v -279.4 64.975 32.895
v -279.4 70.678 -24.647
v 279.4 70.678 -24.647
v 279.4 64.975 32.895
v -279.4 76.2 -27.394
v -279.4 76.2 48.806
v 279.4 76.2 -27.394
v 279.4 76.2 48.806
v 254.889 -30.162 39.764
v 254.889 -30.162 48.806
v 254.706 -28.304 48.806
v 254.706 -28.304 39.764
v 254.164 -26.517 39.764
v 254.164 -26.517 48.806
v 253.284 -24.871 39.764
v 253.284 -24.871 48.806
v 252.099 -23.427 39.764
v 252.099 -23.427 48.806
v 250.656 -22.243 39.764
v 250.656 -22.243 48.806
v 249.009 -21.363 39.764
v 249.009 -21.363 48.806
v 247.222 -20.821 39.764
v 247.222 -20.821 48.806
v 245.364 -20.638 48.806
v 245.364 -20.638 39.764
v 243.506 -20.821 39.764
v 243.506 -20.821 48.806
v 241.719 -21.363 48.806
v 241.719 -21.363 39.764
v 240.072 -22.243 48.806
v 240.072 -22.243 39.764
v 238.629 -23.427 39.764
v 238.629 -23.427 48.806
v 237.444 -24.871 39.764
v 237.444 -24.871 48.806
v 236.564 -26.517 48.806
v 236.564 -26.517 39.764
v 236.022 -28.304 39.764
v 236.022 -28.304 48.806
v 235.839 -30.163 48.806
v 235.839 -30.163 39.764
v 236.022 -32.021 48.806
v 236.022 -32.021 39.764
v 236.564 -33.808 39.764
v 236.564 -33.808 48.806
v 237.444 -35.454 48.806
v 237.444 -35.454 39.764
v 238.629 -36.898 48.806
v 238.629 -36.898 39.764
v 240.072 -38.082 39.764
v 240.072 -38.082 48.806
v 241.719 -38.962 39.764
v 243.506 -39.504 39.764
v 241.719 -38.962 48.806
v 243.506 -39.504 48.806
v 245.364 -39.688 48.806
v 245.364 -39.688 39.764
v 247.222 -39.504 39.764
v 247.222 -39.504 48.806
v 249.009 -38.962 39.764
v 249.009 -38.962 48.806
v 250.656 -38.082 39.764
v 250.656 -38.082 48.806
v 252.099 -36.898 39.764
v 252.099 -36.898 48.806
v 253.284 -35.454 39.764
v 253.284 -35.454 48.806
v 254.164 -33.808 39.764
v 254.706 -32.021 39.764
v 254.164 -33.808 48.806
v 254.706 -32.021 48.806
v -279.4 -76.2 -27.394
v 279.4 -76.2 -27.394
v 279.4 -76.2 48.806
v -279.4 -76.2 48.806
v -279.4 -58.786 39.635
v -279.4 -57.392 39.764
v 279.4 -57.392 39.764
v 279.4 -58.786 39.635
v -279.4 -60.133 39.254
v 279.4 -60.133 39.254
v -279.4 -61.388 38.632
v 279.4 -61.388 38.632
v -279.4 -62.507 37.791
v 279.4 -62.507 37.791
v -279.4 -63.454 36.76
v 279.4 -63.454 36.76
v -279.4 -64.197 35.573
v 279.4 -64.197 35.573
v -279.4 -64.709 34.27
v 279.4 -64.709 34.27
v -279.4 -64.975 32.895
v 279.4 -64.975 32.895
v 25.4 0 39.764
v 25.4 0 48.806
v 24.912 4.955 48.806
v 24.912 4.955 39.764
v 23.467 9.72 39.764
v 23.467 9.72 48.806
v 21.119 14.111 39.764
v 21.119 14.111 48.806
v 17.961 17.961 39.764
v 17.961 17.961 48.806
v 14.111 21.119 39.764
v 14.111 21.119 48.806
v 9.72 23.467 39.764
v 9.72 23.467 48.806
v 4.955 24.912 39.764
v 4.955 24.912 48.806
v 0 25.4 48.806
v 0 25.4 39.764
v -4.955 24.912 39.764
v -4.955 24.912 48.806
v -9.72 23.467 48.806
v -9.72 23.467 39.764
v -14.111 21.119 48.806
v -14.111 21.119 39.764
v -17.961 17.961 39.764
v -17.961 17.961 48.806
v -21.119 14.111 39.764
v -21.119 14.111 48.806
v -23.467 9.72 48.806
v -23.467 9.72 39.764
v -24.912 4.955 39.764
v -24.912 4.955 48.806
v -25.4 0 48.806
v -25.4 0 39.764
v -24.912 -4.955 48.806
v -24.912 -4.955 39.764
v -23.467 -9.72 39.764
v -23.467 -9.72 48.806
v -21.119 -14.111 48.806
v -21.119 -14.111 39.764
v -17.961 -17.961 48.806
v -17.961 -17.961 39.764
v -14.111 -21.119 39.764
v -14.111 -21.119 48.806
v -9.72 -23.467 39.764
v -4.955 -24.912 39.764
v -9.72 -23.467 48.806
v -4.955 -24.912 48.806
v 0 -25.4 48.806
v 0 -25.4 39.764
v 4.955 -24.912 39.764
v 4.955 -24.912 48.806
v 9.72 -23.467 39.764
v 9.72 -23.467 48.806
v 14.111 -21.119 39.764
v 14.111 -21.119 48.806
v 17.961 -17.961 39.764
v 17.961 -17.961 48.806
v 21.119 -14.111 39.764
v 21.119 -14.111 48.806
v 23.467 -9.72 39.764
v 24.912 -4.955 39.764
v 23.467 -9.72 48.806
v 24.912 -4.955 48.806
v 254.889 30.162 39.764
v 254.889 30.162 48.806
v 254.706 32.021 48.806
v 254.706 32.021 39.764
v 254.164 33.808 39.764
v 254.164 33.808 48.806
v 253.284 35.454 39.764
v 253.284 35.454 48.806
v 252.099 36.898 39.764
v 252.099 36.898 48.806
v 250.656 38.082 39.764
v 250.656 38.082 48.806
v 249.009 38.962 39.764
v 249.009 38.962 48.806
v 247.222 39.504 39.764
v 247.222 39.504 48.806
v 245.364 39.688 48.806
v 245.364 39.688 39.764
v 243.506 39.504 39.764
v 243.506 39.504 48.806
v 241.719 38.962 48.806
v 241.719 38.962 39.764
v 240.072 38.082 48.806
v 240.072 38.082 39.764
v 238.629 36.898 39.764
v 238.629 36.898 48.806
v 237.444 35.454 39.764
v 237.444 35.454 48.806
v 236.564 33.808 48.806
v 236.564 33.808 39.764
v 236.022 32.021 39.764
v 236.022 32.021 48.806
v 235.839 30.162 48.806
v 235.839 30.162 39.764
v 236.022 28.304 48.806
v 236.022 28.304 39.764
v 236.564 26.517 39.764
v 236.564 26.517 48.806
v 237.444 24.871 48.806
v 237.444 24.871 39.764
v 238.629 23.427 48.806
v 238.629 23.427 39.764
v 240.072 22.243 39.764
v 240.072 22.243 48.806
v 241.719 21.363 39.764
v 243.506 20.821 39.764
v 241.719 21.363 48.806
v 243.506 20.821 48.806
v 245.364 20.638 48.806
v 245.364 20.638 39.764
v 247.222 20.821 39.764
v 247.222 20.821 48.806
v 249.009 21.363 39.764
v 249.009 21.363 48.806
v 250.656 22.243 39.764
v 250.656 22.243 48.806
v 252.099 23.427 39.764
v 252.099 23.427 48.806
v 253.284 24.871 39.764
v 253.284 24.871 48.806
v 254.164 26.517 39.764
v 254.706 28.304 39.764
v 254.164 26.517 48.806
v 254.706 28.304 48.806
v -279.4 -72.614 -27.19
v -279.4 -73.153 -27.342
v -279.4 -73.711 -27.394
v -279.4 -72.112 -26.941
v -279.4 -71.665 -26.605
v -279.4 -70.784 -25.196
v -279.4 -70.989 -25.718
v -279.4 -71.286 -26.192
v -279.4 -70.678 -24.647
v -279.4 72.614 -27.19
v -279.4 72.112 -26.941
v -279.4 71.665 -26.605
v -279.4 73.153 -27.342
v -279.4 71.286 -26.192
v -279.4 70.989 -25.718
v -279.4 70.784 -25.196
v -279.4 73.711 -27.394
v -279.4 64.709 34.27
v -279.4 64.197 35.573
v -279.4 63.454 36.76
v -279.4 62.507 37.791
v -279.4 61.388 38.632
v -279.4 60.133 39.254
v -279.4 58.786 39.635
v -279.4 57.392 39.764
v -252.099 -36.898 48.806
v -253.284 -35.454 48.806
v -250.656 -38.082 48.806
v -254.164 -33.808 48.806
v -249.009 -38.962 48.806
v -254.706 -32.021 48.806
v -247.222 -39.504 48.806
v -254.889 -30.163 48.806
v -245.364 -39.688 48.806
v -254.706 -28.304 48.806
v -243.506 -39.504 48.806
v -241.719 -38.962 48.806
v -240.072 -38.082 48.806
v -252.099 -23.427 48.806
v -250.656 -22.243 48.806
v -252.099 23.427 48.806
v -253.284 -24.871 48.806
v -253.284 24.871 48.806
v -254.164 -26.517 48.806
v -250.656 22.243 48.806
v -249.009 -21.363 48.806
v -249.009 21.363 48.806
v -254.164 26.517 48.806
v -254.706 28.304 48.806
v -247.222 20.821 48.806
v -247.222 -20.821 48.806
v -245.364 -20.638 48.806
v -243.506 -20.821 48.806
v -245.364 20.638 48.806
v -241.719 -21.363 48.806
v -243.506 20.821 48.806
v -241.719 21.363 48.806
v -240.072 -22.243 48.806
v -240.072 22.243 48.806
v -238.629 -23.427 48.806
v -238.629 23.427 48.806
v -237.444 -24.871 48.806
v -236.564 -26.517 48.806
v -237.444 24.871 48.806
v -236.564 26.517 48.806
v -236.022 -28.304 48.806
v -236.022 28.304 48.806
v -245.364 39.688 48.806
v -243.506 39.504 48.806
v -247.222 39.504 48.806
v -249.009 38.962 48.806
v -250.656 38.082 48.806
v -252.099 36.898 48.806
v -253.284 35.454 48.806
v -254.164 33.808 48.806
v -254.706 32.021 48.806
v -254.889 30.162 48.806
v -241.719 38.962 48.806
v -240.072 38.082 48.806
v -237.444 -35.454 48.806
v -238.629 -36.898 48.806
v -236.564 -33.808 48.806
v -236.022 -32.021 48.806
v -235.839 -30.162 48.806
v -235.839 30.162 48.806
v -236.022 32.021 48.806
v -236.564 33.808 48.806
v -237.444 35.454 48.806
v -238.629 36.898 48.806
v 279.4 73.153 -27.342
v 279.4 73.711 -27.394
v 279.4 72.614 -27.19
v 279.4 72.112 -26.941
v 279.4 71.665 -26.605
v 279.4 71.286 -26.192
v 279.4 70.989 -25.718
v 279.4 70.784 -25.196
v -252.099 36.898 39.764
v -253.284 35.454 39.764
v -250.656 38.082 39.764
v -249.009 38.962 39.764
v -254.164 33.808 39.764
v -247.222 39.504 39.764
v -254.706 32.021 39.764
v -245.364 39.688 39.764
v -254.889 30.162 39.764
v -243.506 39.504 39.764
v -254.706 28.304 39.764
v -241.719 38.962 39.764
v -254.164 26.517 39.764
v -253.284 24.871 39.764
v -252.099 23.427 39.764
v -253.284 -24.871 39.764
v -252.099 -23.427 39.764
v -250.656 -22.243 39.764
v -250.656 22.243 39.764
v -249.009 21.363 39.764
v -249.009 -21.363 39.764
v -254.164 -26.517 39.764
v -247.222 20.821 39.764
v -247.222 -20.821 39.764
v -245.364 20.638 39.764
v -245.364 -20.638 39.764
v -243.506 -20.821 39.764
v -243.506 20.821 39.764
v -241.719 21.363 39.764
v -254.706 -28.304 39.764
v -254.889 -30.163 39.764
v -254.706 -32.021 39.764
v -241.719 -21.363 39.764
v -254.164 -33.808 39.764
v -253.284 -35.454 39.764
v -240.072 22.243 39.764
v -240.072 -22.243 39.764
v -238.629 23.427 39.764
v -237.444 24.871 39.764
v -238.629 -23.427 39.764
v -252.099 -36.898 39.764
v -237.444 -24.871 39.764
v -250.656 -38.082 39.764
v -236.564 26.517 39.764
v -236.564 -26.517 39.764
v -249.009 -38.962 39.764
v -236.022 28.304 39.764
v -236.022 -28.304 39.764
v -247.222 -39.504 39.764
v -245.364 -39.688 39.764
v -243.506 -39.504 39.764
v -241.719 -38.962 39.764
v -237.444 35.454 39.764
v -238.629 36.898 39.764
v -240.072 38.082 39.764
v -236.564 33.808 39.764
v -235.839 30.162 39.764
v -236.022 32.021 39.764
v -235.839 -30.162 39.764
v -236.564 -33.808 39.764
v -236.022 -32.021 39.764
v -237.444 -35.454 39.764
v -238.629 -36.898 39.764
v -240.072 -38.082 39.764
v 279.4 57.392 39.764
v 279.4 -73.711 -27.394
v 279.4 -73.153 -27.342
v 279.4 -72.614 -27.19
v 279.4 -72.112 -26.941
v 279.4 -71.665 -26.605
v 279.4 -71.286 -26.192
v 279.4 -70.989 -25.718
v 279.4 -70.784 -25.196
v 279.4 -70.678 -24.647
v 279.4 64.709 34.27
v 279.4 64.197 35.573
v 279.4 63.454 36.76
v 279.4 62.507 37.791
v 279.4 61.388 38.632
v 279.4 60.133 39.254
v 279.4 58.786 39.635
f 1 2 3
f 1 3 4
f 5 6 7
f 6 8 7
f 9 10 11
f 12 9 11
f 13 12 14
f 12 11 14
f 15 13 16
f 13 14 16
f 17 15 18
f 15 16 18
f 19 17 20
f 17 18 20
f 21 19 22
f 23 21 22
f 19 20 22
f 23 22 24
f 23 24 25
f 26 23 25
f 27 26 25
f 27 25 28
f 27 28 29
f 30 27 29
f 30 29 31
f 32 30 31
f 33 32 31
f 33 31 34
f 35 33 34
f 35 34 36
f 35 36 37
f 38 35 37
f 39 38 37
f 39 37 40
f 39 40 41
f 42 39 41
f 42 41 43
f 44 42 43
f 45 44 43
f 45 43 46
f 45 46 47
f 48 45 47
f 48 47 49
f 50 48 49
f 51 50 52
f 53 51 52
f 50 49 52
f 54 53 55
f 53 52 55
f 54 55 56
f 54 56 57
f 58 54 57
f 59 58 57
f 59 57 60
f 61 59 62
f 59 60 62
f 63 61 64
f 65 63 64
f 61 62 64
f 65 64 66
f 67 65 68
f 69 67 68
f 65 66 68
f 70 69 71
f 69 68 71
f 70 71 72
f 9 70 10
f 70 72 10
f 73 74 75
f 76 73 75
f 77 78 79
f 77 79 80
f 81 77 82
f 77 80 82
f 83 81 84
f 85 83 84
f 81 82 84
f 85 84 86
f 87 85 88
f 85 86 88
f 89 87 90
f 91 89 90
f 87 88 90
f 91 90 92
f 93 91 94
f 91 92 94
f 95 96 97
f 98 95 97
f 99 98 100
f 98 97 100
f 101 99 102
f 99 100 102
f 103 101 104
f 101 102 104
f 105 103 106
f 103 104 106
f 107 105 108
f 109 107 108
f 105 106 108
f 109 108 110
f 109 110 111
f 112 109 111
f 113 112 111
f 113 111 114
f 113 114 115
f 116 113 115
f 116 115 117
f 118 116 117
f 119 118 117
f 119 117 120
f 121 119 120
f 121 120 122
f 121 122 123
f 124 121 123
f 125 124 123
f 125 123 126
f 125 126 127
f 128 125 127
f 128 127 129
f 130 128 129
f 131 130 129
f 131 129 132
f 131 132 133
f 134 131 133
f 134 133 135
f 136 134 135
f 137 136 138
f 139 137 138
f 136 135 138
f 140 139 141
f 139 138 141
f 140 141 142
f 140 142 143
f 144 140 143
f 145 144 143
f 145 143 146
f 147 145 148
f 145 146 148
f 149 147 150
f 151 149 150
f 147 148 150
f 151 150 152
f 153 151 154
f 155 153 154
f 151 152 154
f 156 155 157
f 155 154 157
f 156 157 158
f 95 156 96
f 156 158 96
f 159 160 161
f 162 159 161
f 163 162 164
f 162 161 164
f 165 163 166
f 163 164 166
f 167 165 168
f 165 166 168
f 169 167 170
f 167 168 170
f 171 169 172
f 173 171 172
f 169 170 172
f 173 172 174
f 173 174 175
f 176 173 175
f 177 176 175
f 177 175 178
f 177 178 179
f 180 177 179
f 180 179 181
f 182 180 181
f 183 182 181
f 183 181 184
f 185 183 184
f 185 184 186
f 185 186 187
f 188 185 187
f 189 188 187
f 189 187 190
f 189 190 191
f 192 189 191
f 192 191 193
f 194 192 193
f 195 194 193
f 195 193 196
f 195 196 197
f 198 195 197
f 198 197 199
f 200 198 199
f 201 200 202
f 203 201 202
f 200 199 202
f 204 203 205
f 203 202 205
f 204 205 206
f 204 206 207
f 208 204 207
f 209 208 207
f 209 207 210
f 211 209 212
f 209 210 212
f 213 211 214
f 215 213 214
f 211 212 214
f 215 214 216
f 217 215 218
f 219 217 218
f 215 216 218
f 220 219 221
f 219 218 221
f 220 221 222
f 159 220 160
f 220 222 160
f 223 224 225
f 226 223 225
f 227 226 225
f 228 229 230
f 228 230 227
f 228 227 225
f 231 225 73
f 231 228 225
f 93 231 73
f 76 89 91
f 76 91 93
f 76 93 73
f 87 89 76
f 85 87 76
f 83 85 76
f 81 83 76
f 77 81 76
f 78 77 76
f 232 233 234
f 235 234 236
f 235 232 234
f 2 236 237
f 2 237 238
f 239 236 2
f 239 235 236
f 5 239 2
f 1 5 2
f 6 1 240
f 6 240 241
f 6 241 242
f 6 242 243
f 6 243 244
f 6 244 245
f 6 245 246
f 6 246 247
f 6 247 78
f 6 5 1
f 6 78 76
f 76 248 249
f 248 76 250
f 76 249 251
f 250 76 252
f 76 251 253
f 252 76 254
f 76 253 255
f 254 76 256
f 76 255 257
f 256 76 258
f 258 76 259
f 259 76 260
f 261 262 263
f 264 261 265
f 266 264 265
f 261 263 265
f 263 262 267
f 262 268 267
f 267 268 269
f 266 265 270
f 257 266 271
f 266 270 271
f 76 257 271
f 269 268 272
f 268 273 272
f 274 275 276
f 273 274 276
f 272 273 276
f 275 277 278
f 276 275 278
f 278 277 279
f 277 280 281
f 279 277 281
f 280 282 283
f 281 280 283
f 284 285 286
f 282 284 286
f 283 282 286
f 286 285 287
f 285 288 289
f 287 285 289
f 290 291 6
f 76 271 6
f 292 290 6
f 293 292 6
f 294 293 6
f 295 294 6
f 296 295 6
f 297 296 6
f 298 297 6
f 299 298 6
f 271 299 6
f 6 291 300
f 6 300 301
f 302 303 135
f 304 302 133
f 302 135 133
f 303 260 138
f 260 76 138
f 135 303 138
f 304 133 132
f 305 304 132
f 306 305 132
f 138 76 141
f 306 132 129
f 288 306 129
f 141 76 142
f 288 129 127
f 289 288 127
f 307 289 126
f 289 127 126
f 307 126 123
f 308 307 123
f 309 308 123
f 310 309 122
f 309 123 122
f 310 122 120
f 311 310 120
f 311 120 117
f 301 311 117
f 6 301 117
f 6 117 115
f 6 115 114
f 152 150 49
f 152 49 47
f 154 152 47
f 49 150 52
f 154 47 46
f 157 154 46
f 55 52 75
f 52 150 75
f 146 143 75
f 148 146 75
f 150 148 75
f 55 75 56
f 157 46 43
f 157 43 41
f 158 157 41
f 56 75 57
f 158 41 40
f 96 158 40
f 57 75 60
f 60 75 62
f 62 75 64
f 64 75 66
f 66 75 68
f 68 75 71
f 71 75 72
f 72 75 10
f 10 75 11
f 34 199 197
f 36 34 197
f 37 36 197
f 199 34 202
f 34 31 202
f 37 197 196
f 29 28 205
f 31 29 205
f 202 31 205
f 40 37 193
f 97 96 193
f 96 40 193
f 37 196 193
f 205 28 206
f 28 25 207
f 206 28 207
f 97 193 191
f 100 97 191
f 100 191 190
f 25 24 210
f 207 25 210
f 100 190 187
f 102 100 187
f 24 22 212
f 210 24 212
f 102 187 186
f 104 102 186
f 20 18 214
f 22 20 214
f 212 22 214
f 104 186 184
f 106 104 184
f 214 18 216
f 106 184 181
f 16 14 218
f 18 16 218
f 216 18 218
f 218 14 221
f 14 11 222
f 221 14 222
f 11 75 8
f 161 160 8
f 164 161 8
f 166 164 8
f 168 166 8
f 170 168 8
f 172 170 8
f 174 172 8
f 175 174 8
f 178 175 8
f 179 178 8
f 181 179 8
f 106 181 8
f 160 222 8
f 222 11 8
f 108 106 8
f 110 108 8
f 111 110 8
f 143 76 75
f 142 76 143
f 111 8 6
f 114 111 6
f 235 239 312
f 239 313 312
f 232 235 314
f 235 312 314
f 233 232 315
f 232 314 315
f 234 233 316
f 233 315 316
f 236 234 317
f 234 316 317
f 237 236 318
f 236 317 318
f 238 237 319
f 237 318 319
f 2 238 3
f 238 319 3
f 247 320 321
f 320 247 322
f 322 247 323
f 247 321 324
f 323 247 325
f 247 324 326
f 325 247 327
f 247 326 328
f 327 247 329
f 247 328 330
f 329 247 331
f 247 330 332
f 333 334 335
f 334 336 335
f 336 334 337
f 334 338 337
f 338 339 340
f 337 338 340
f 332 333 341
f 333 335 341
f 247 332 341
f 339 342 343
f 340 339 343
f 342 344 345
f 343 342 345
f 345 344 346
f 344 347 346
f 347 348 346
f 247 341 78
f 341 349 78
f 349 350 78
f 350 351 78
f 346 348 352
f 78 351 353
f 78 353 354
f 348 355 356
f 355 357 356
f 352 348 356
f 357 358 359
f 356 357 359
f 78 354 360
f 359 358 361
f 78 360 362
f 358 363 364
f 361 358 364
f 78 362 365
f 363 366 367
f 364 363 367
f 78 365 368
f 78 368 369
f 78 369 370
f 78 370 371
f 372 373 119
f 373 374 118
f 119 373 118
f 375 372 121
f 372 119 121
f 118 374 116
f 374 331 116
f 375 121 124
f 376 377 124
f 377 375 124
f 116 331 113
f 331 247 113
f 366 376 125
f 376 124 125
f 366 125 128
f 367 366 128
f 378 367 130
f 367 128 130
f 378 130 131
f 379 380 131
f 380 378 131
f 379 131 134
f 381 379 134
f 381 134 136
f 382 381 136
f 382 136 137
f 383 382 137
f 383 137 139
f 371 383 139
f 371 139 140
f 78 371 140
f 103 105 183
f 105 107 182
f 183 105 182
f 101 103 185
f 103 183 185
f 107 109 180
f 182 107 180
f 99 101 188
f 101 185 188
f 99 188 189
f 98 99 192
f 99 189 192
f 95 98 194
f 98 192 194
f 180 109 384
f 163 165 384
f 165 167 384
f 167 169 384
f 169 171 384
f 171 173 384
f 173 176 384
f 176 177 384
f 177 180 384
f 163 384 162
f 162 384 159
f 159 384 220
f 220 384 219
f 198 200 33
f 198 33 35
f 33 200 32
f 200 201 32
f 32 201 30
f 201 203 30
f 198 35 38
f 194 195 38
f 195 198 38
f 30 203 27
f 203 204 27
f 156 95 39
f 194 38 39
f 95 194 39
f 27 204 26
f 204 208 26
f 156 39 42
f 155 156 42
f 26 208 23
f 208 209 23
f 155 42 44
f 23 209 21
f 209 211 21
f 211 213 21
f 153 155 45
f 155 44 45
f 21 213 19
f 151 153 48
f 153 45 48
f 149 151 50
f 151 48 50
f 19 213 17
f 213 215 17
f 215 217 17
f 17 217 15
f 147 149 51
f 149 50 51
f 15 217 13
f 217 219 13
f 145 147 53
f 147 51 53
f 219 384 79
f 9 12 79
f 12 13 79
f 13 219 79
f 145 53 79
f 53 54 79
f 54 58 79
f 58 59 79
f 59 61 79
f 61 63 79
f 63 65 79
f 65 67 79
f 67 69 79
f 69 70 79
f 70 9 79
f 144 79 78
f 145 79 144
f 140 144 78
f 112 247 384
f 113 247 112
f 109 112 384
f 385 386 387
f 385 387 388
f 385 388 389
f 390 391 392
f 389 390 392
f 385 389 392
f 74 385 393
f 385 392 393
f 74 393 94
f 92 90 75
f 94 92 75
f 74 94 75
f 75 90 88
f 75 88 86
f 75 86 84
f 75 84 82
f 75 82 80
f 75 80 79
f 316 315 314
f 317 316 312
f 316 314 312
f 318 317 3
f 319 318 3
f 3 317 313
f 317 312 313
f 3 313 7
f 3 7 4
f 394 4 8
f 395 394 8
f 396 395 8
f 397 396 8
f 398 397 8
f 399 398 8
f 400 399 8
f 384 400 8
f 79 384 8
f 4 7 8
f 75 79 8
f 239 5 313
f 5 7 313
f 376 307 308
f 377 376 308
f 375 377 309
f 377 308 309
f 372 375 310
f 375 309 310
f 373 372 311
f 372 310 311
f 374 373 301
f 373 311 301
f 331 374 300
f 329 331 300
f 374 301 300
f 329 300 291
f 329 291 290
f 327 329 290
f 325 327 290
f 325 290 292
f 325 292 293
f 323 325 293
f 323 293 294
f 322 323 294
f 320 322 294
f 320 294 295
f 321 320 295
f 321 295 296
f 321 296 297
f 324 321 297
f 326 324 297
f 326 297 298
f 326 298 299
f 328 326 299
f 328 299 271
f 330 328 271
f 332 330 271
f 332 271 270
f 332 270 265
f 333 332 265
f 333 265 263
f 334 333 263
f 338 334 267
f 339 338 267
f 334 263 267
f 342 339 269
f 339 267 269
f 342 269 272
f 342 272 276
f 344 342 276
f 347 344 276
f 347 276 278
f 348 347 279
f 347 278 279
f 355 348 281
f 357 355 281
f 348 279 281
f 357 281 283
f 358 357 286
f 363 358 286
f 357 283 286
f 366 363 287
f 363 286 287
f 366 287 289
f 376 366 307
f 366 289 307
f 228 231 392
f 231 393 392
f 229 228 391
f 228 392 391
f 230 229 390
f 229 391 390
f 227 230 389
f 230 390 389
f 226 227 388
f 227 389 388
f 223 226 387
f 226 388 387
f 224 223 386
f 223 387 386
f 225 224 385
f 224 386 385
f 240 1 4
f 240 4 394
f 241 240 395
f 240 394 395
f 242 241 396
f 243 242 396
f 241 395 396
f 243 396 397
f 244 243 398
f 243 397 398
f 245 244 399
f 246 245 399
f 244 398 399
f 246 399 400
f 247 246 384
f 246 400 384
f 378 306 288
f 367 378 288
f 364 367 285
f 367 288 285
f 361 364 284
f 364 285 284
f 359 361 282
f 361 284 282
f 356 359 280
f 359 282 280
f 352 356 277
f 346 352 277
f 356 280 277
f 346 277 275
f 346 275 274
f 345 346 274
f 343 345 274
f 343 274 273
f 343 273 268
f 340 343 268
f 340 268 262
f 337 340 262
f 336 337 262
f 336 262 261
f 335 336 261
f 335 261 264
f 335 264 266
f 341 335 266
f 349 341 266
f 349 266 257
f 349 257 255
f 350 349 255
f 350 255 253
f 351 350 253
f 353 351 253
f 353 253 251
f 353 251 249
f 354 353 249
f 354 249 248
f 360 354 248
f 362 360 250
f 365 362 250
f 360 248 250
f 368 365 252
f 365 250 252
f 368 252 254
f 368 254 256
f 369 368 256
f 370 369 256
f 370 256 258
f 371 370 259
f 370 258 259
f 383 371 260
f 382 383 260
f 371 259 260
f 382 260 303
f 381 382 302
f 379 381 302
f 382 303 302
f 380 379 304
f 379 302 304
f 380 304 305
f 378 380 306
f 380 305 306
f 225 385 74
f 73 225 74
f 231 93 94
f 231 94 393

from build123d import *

# Parameters (mm, degrees)
BOSS_EXTRUDE1_DEPTH = 279.4
CUT_EXTRUDE1_REACH  = 78.2
SKETCH2_R           = 25.4
CUT_EXTRUDE2_REACH  = 78.2
SKETCH3_R           = 9.525


with BuildPart() as part:
    # Sketch1 → Boss-Extrude1 (new body, symmetric)
    with BuildSketch(Plane(origin=(0, 0, 0), x_dir=(0, 0, -1), z_dir=(1, 0, 0))):
        with BuildLine():
            Line((-48.8061, -76.2), (-48.8061, 76.2))
            Line((-48.8061, 76.2), (27.3939, 76.2))
            Line((27.3939, 76.2), (27.3939, 73.710744653))
            ThreePointArc((27.3939, 73.710744653), (26.604945151, 71.66452399), (24.646512202, 70.677604975))
            Line((24.646512202, 70.677604975), (-32.895230506, 64.974685943))
            ThreePointArc((-32.895230506, 64.974685943), (-37.791312879, 62.507388407), (-39.7637, 57.391836749))
            Line((-39.7637, 57.391836749), (-39.7637, -57.391836749))
            ThreePointArc((-39.7637, -57.391836749), (-37.791312879, -62.507388407), (-32.895230506, -64.974685943))
            Line((-32.895230506, -64.974685943), (24.646512202, -70.677604975))
            ThreePointArc((24.646512202, -70.677604975), (26.604945151, -71.66452399), (27.3939, -73.710744653))
            Line((27.3939, -73.710744653), (27.3939, -76.2))
            Line((27.3939, -76.2), (-48.8061, -76.2))
        make_face()
    extrude(amount=BOSS_EXTRUDE1_DEPTH, both=True)

    # Sketch2 → Cut-Extrude1 (cut, up to next)
    with BuildSketch(Plane.XY.offset(48.8061), mode=Mode.PRIVATE) as cut_extrude1_sk1:
        Circle(SKETCH2_R)
    cut_extrude1_tool1 = extrude(cut_extrude1_sk1.sketch, amount=-CUT_EXTRUDE1_REACH, mode=Mode.PRIVATE) & part.part
    add(cut_extrude1_tool1.solids().sort_by_distance((0, 0, 48.8061))[0], mode=Mode.SUBTRACT)

    # Sketch3 → Cut-Extrude2 (cut, up to next)
    with BuildSketch(Plane.XY.offset(48.8061), mode=Mode.PRIVATE) as cut_extrude2_sk1:
        with Locations((-245.364, 30.1625)):
            Circle(SKETCH3_R)
    cut_extrude2_tool1 = extrude(cut_extrude2_sk1.sketch, amount=-CUT_EXTRUDE2_REACH, mode=Mode.PRIVATE) & part.part
    add(cut_extrude2_tool1.solids().sort_by_distance((-245.364, 30.1625, 48.8061))[0], mode=Mode.SUBTRACT)
    # Sketch3 → Cut-Extrude2 (cut, up to next)
    with BuildSketch(Plane.XY.offset(48.8061), mode=Mode.PRIVATE) as cut_extrude2_sk2:
        with Locations((245.364, 30.1625)):
            Circle(SKETCH3_R)
    cut_extrude2_tool2 = extrude(cut_extrude2_sk2.sketch, amount=-CUT_EXTRUDE2_REACH, mode=Mode.PRIVATE) & part.part
    add(cut_extrude2_tool2.solids().sort_by_distance((245.364, 30.1625, 48.8061))[0], mode=Mode.SUBTRACT)
    # Sketch3 → Cut-Extrude2 (cut, up to next)
    with BuildSketch(Plane.XY.offset(48.8061), mode=Mode.PRIVATE) as cut_extrude2_sk3:
        with Locations((245.364, -30.1625)):
            Circle(SKETCH3_R)
    cut_extrude2_tool3 = extrude(cut_extrude2_sk3.sketch, amount=-CUT_EXTRUDE2_REACH, mode=Mode.PRIVATE) & part.part
    add(cut_extrude2_tool3.solids().sort_by_distance((245.364, -30.1625, 48.8061))[0], mode=Mode.SUBTRACT)
    # Sketch3 → Cut-Extrude2 (cut, up to next)
    with BuildSketch(Plane.XY.offset(48.8061), mode=Mode.PRIVATE) as cut_extrude2_sk4:
        with Locations((-245.364, -30.1625)):
            Circle(SKETCH3_R)
    cut_extrude2_tool4 = extrude(cut_extrude2_sk4.sketch, amount=-CUT_EXTRUDE2_REACH, mode=Mode.PRIVATE) & part.part
    add(cut_extrude2_tool4.solids().sort_by_distance((-245.364, -30.1625, 48.8061))[0], mode=Mode.SUBTRACT)


solid = part.part
